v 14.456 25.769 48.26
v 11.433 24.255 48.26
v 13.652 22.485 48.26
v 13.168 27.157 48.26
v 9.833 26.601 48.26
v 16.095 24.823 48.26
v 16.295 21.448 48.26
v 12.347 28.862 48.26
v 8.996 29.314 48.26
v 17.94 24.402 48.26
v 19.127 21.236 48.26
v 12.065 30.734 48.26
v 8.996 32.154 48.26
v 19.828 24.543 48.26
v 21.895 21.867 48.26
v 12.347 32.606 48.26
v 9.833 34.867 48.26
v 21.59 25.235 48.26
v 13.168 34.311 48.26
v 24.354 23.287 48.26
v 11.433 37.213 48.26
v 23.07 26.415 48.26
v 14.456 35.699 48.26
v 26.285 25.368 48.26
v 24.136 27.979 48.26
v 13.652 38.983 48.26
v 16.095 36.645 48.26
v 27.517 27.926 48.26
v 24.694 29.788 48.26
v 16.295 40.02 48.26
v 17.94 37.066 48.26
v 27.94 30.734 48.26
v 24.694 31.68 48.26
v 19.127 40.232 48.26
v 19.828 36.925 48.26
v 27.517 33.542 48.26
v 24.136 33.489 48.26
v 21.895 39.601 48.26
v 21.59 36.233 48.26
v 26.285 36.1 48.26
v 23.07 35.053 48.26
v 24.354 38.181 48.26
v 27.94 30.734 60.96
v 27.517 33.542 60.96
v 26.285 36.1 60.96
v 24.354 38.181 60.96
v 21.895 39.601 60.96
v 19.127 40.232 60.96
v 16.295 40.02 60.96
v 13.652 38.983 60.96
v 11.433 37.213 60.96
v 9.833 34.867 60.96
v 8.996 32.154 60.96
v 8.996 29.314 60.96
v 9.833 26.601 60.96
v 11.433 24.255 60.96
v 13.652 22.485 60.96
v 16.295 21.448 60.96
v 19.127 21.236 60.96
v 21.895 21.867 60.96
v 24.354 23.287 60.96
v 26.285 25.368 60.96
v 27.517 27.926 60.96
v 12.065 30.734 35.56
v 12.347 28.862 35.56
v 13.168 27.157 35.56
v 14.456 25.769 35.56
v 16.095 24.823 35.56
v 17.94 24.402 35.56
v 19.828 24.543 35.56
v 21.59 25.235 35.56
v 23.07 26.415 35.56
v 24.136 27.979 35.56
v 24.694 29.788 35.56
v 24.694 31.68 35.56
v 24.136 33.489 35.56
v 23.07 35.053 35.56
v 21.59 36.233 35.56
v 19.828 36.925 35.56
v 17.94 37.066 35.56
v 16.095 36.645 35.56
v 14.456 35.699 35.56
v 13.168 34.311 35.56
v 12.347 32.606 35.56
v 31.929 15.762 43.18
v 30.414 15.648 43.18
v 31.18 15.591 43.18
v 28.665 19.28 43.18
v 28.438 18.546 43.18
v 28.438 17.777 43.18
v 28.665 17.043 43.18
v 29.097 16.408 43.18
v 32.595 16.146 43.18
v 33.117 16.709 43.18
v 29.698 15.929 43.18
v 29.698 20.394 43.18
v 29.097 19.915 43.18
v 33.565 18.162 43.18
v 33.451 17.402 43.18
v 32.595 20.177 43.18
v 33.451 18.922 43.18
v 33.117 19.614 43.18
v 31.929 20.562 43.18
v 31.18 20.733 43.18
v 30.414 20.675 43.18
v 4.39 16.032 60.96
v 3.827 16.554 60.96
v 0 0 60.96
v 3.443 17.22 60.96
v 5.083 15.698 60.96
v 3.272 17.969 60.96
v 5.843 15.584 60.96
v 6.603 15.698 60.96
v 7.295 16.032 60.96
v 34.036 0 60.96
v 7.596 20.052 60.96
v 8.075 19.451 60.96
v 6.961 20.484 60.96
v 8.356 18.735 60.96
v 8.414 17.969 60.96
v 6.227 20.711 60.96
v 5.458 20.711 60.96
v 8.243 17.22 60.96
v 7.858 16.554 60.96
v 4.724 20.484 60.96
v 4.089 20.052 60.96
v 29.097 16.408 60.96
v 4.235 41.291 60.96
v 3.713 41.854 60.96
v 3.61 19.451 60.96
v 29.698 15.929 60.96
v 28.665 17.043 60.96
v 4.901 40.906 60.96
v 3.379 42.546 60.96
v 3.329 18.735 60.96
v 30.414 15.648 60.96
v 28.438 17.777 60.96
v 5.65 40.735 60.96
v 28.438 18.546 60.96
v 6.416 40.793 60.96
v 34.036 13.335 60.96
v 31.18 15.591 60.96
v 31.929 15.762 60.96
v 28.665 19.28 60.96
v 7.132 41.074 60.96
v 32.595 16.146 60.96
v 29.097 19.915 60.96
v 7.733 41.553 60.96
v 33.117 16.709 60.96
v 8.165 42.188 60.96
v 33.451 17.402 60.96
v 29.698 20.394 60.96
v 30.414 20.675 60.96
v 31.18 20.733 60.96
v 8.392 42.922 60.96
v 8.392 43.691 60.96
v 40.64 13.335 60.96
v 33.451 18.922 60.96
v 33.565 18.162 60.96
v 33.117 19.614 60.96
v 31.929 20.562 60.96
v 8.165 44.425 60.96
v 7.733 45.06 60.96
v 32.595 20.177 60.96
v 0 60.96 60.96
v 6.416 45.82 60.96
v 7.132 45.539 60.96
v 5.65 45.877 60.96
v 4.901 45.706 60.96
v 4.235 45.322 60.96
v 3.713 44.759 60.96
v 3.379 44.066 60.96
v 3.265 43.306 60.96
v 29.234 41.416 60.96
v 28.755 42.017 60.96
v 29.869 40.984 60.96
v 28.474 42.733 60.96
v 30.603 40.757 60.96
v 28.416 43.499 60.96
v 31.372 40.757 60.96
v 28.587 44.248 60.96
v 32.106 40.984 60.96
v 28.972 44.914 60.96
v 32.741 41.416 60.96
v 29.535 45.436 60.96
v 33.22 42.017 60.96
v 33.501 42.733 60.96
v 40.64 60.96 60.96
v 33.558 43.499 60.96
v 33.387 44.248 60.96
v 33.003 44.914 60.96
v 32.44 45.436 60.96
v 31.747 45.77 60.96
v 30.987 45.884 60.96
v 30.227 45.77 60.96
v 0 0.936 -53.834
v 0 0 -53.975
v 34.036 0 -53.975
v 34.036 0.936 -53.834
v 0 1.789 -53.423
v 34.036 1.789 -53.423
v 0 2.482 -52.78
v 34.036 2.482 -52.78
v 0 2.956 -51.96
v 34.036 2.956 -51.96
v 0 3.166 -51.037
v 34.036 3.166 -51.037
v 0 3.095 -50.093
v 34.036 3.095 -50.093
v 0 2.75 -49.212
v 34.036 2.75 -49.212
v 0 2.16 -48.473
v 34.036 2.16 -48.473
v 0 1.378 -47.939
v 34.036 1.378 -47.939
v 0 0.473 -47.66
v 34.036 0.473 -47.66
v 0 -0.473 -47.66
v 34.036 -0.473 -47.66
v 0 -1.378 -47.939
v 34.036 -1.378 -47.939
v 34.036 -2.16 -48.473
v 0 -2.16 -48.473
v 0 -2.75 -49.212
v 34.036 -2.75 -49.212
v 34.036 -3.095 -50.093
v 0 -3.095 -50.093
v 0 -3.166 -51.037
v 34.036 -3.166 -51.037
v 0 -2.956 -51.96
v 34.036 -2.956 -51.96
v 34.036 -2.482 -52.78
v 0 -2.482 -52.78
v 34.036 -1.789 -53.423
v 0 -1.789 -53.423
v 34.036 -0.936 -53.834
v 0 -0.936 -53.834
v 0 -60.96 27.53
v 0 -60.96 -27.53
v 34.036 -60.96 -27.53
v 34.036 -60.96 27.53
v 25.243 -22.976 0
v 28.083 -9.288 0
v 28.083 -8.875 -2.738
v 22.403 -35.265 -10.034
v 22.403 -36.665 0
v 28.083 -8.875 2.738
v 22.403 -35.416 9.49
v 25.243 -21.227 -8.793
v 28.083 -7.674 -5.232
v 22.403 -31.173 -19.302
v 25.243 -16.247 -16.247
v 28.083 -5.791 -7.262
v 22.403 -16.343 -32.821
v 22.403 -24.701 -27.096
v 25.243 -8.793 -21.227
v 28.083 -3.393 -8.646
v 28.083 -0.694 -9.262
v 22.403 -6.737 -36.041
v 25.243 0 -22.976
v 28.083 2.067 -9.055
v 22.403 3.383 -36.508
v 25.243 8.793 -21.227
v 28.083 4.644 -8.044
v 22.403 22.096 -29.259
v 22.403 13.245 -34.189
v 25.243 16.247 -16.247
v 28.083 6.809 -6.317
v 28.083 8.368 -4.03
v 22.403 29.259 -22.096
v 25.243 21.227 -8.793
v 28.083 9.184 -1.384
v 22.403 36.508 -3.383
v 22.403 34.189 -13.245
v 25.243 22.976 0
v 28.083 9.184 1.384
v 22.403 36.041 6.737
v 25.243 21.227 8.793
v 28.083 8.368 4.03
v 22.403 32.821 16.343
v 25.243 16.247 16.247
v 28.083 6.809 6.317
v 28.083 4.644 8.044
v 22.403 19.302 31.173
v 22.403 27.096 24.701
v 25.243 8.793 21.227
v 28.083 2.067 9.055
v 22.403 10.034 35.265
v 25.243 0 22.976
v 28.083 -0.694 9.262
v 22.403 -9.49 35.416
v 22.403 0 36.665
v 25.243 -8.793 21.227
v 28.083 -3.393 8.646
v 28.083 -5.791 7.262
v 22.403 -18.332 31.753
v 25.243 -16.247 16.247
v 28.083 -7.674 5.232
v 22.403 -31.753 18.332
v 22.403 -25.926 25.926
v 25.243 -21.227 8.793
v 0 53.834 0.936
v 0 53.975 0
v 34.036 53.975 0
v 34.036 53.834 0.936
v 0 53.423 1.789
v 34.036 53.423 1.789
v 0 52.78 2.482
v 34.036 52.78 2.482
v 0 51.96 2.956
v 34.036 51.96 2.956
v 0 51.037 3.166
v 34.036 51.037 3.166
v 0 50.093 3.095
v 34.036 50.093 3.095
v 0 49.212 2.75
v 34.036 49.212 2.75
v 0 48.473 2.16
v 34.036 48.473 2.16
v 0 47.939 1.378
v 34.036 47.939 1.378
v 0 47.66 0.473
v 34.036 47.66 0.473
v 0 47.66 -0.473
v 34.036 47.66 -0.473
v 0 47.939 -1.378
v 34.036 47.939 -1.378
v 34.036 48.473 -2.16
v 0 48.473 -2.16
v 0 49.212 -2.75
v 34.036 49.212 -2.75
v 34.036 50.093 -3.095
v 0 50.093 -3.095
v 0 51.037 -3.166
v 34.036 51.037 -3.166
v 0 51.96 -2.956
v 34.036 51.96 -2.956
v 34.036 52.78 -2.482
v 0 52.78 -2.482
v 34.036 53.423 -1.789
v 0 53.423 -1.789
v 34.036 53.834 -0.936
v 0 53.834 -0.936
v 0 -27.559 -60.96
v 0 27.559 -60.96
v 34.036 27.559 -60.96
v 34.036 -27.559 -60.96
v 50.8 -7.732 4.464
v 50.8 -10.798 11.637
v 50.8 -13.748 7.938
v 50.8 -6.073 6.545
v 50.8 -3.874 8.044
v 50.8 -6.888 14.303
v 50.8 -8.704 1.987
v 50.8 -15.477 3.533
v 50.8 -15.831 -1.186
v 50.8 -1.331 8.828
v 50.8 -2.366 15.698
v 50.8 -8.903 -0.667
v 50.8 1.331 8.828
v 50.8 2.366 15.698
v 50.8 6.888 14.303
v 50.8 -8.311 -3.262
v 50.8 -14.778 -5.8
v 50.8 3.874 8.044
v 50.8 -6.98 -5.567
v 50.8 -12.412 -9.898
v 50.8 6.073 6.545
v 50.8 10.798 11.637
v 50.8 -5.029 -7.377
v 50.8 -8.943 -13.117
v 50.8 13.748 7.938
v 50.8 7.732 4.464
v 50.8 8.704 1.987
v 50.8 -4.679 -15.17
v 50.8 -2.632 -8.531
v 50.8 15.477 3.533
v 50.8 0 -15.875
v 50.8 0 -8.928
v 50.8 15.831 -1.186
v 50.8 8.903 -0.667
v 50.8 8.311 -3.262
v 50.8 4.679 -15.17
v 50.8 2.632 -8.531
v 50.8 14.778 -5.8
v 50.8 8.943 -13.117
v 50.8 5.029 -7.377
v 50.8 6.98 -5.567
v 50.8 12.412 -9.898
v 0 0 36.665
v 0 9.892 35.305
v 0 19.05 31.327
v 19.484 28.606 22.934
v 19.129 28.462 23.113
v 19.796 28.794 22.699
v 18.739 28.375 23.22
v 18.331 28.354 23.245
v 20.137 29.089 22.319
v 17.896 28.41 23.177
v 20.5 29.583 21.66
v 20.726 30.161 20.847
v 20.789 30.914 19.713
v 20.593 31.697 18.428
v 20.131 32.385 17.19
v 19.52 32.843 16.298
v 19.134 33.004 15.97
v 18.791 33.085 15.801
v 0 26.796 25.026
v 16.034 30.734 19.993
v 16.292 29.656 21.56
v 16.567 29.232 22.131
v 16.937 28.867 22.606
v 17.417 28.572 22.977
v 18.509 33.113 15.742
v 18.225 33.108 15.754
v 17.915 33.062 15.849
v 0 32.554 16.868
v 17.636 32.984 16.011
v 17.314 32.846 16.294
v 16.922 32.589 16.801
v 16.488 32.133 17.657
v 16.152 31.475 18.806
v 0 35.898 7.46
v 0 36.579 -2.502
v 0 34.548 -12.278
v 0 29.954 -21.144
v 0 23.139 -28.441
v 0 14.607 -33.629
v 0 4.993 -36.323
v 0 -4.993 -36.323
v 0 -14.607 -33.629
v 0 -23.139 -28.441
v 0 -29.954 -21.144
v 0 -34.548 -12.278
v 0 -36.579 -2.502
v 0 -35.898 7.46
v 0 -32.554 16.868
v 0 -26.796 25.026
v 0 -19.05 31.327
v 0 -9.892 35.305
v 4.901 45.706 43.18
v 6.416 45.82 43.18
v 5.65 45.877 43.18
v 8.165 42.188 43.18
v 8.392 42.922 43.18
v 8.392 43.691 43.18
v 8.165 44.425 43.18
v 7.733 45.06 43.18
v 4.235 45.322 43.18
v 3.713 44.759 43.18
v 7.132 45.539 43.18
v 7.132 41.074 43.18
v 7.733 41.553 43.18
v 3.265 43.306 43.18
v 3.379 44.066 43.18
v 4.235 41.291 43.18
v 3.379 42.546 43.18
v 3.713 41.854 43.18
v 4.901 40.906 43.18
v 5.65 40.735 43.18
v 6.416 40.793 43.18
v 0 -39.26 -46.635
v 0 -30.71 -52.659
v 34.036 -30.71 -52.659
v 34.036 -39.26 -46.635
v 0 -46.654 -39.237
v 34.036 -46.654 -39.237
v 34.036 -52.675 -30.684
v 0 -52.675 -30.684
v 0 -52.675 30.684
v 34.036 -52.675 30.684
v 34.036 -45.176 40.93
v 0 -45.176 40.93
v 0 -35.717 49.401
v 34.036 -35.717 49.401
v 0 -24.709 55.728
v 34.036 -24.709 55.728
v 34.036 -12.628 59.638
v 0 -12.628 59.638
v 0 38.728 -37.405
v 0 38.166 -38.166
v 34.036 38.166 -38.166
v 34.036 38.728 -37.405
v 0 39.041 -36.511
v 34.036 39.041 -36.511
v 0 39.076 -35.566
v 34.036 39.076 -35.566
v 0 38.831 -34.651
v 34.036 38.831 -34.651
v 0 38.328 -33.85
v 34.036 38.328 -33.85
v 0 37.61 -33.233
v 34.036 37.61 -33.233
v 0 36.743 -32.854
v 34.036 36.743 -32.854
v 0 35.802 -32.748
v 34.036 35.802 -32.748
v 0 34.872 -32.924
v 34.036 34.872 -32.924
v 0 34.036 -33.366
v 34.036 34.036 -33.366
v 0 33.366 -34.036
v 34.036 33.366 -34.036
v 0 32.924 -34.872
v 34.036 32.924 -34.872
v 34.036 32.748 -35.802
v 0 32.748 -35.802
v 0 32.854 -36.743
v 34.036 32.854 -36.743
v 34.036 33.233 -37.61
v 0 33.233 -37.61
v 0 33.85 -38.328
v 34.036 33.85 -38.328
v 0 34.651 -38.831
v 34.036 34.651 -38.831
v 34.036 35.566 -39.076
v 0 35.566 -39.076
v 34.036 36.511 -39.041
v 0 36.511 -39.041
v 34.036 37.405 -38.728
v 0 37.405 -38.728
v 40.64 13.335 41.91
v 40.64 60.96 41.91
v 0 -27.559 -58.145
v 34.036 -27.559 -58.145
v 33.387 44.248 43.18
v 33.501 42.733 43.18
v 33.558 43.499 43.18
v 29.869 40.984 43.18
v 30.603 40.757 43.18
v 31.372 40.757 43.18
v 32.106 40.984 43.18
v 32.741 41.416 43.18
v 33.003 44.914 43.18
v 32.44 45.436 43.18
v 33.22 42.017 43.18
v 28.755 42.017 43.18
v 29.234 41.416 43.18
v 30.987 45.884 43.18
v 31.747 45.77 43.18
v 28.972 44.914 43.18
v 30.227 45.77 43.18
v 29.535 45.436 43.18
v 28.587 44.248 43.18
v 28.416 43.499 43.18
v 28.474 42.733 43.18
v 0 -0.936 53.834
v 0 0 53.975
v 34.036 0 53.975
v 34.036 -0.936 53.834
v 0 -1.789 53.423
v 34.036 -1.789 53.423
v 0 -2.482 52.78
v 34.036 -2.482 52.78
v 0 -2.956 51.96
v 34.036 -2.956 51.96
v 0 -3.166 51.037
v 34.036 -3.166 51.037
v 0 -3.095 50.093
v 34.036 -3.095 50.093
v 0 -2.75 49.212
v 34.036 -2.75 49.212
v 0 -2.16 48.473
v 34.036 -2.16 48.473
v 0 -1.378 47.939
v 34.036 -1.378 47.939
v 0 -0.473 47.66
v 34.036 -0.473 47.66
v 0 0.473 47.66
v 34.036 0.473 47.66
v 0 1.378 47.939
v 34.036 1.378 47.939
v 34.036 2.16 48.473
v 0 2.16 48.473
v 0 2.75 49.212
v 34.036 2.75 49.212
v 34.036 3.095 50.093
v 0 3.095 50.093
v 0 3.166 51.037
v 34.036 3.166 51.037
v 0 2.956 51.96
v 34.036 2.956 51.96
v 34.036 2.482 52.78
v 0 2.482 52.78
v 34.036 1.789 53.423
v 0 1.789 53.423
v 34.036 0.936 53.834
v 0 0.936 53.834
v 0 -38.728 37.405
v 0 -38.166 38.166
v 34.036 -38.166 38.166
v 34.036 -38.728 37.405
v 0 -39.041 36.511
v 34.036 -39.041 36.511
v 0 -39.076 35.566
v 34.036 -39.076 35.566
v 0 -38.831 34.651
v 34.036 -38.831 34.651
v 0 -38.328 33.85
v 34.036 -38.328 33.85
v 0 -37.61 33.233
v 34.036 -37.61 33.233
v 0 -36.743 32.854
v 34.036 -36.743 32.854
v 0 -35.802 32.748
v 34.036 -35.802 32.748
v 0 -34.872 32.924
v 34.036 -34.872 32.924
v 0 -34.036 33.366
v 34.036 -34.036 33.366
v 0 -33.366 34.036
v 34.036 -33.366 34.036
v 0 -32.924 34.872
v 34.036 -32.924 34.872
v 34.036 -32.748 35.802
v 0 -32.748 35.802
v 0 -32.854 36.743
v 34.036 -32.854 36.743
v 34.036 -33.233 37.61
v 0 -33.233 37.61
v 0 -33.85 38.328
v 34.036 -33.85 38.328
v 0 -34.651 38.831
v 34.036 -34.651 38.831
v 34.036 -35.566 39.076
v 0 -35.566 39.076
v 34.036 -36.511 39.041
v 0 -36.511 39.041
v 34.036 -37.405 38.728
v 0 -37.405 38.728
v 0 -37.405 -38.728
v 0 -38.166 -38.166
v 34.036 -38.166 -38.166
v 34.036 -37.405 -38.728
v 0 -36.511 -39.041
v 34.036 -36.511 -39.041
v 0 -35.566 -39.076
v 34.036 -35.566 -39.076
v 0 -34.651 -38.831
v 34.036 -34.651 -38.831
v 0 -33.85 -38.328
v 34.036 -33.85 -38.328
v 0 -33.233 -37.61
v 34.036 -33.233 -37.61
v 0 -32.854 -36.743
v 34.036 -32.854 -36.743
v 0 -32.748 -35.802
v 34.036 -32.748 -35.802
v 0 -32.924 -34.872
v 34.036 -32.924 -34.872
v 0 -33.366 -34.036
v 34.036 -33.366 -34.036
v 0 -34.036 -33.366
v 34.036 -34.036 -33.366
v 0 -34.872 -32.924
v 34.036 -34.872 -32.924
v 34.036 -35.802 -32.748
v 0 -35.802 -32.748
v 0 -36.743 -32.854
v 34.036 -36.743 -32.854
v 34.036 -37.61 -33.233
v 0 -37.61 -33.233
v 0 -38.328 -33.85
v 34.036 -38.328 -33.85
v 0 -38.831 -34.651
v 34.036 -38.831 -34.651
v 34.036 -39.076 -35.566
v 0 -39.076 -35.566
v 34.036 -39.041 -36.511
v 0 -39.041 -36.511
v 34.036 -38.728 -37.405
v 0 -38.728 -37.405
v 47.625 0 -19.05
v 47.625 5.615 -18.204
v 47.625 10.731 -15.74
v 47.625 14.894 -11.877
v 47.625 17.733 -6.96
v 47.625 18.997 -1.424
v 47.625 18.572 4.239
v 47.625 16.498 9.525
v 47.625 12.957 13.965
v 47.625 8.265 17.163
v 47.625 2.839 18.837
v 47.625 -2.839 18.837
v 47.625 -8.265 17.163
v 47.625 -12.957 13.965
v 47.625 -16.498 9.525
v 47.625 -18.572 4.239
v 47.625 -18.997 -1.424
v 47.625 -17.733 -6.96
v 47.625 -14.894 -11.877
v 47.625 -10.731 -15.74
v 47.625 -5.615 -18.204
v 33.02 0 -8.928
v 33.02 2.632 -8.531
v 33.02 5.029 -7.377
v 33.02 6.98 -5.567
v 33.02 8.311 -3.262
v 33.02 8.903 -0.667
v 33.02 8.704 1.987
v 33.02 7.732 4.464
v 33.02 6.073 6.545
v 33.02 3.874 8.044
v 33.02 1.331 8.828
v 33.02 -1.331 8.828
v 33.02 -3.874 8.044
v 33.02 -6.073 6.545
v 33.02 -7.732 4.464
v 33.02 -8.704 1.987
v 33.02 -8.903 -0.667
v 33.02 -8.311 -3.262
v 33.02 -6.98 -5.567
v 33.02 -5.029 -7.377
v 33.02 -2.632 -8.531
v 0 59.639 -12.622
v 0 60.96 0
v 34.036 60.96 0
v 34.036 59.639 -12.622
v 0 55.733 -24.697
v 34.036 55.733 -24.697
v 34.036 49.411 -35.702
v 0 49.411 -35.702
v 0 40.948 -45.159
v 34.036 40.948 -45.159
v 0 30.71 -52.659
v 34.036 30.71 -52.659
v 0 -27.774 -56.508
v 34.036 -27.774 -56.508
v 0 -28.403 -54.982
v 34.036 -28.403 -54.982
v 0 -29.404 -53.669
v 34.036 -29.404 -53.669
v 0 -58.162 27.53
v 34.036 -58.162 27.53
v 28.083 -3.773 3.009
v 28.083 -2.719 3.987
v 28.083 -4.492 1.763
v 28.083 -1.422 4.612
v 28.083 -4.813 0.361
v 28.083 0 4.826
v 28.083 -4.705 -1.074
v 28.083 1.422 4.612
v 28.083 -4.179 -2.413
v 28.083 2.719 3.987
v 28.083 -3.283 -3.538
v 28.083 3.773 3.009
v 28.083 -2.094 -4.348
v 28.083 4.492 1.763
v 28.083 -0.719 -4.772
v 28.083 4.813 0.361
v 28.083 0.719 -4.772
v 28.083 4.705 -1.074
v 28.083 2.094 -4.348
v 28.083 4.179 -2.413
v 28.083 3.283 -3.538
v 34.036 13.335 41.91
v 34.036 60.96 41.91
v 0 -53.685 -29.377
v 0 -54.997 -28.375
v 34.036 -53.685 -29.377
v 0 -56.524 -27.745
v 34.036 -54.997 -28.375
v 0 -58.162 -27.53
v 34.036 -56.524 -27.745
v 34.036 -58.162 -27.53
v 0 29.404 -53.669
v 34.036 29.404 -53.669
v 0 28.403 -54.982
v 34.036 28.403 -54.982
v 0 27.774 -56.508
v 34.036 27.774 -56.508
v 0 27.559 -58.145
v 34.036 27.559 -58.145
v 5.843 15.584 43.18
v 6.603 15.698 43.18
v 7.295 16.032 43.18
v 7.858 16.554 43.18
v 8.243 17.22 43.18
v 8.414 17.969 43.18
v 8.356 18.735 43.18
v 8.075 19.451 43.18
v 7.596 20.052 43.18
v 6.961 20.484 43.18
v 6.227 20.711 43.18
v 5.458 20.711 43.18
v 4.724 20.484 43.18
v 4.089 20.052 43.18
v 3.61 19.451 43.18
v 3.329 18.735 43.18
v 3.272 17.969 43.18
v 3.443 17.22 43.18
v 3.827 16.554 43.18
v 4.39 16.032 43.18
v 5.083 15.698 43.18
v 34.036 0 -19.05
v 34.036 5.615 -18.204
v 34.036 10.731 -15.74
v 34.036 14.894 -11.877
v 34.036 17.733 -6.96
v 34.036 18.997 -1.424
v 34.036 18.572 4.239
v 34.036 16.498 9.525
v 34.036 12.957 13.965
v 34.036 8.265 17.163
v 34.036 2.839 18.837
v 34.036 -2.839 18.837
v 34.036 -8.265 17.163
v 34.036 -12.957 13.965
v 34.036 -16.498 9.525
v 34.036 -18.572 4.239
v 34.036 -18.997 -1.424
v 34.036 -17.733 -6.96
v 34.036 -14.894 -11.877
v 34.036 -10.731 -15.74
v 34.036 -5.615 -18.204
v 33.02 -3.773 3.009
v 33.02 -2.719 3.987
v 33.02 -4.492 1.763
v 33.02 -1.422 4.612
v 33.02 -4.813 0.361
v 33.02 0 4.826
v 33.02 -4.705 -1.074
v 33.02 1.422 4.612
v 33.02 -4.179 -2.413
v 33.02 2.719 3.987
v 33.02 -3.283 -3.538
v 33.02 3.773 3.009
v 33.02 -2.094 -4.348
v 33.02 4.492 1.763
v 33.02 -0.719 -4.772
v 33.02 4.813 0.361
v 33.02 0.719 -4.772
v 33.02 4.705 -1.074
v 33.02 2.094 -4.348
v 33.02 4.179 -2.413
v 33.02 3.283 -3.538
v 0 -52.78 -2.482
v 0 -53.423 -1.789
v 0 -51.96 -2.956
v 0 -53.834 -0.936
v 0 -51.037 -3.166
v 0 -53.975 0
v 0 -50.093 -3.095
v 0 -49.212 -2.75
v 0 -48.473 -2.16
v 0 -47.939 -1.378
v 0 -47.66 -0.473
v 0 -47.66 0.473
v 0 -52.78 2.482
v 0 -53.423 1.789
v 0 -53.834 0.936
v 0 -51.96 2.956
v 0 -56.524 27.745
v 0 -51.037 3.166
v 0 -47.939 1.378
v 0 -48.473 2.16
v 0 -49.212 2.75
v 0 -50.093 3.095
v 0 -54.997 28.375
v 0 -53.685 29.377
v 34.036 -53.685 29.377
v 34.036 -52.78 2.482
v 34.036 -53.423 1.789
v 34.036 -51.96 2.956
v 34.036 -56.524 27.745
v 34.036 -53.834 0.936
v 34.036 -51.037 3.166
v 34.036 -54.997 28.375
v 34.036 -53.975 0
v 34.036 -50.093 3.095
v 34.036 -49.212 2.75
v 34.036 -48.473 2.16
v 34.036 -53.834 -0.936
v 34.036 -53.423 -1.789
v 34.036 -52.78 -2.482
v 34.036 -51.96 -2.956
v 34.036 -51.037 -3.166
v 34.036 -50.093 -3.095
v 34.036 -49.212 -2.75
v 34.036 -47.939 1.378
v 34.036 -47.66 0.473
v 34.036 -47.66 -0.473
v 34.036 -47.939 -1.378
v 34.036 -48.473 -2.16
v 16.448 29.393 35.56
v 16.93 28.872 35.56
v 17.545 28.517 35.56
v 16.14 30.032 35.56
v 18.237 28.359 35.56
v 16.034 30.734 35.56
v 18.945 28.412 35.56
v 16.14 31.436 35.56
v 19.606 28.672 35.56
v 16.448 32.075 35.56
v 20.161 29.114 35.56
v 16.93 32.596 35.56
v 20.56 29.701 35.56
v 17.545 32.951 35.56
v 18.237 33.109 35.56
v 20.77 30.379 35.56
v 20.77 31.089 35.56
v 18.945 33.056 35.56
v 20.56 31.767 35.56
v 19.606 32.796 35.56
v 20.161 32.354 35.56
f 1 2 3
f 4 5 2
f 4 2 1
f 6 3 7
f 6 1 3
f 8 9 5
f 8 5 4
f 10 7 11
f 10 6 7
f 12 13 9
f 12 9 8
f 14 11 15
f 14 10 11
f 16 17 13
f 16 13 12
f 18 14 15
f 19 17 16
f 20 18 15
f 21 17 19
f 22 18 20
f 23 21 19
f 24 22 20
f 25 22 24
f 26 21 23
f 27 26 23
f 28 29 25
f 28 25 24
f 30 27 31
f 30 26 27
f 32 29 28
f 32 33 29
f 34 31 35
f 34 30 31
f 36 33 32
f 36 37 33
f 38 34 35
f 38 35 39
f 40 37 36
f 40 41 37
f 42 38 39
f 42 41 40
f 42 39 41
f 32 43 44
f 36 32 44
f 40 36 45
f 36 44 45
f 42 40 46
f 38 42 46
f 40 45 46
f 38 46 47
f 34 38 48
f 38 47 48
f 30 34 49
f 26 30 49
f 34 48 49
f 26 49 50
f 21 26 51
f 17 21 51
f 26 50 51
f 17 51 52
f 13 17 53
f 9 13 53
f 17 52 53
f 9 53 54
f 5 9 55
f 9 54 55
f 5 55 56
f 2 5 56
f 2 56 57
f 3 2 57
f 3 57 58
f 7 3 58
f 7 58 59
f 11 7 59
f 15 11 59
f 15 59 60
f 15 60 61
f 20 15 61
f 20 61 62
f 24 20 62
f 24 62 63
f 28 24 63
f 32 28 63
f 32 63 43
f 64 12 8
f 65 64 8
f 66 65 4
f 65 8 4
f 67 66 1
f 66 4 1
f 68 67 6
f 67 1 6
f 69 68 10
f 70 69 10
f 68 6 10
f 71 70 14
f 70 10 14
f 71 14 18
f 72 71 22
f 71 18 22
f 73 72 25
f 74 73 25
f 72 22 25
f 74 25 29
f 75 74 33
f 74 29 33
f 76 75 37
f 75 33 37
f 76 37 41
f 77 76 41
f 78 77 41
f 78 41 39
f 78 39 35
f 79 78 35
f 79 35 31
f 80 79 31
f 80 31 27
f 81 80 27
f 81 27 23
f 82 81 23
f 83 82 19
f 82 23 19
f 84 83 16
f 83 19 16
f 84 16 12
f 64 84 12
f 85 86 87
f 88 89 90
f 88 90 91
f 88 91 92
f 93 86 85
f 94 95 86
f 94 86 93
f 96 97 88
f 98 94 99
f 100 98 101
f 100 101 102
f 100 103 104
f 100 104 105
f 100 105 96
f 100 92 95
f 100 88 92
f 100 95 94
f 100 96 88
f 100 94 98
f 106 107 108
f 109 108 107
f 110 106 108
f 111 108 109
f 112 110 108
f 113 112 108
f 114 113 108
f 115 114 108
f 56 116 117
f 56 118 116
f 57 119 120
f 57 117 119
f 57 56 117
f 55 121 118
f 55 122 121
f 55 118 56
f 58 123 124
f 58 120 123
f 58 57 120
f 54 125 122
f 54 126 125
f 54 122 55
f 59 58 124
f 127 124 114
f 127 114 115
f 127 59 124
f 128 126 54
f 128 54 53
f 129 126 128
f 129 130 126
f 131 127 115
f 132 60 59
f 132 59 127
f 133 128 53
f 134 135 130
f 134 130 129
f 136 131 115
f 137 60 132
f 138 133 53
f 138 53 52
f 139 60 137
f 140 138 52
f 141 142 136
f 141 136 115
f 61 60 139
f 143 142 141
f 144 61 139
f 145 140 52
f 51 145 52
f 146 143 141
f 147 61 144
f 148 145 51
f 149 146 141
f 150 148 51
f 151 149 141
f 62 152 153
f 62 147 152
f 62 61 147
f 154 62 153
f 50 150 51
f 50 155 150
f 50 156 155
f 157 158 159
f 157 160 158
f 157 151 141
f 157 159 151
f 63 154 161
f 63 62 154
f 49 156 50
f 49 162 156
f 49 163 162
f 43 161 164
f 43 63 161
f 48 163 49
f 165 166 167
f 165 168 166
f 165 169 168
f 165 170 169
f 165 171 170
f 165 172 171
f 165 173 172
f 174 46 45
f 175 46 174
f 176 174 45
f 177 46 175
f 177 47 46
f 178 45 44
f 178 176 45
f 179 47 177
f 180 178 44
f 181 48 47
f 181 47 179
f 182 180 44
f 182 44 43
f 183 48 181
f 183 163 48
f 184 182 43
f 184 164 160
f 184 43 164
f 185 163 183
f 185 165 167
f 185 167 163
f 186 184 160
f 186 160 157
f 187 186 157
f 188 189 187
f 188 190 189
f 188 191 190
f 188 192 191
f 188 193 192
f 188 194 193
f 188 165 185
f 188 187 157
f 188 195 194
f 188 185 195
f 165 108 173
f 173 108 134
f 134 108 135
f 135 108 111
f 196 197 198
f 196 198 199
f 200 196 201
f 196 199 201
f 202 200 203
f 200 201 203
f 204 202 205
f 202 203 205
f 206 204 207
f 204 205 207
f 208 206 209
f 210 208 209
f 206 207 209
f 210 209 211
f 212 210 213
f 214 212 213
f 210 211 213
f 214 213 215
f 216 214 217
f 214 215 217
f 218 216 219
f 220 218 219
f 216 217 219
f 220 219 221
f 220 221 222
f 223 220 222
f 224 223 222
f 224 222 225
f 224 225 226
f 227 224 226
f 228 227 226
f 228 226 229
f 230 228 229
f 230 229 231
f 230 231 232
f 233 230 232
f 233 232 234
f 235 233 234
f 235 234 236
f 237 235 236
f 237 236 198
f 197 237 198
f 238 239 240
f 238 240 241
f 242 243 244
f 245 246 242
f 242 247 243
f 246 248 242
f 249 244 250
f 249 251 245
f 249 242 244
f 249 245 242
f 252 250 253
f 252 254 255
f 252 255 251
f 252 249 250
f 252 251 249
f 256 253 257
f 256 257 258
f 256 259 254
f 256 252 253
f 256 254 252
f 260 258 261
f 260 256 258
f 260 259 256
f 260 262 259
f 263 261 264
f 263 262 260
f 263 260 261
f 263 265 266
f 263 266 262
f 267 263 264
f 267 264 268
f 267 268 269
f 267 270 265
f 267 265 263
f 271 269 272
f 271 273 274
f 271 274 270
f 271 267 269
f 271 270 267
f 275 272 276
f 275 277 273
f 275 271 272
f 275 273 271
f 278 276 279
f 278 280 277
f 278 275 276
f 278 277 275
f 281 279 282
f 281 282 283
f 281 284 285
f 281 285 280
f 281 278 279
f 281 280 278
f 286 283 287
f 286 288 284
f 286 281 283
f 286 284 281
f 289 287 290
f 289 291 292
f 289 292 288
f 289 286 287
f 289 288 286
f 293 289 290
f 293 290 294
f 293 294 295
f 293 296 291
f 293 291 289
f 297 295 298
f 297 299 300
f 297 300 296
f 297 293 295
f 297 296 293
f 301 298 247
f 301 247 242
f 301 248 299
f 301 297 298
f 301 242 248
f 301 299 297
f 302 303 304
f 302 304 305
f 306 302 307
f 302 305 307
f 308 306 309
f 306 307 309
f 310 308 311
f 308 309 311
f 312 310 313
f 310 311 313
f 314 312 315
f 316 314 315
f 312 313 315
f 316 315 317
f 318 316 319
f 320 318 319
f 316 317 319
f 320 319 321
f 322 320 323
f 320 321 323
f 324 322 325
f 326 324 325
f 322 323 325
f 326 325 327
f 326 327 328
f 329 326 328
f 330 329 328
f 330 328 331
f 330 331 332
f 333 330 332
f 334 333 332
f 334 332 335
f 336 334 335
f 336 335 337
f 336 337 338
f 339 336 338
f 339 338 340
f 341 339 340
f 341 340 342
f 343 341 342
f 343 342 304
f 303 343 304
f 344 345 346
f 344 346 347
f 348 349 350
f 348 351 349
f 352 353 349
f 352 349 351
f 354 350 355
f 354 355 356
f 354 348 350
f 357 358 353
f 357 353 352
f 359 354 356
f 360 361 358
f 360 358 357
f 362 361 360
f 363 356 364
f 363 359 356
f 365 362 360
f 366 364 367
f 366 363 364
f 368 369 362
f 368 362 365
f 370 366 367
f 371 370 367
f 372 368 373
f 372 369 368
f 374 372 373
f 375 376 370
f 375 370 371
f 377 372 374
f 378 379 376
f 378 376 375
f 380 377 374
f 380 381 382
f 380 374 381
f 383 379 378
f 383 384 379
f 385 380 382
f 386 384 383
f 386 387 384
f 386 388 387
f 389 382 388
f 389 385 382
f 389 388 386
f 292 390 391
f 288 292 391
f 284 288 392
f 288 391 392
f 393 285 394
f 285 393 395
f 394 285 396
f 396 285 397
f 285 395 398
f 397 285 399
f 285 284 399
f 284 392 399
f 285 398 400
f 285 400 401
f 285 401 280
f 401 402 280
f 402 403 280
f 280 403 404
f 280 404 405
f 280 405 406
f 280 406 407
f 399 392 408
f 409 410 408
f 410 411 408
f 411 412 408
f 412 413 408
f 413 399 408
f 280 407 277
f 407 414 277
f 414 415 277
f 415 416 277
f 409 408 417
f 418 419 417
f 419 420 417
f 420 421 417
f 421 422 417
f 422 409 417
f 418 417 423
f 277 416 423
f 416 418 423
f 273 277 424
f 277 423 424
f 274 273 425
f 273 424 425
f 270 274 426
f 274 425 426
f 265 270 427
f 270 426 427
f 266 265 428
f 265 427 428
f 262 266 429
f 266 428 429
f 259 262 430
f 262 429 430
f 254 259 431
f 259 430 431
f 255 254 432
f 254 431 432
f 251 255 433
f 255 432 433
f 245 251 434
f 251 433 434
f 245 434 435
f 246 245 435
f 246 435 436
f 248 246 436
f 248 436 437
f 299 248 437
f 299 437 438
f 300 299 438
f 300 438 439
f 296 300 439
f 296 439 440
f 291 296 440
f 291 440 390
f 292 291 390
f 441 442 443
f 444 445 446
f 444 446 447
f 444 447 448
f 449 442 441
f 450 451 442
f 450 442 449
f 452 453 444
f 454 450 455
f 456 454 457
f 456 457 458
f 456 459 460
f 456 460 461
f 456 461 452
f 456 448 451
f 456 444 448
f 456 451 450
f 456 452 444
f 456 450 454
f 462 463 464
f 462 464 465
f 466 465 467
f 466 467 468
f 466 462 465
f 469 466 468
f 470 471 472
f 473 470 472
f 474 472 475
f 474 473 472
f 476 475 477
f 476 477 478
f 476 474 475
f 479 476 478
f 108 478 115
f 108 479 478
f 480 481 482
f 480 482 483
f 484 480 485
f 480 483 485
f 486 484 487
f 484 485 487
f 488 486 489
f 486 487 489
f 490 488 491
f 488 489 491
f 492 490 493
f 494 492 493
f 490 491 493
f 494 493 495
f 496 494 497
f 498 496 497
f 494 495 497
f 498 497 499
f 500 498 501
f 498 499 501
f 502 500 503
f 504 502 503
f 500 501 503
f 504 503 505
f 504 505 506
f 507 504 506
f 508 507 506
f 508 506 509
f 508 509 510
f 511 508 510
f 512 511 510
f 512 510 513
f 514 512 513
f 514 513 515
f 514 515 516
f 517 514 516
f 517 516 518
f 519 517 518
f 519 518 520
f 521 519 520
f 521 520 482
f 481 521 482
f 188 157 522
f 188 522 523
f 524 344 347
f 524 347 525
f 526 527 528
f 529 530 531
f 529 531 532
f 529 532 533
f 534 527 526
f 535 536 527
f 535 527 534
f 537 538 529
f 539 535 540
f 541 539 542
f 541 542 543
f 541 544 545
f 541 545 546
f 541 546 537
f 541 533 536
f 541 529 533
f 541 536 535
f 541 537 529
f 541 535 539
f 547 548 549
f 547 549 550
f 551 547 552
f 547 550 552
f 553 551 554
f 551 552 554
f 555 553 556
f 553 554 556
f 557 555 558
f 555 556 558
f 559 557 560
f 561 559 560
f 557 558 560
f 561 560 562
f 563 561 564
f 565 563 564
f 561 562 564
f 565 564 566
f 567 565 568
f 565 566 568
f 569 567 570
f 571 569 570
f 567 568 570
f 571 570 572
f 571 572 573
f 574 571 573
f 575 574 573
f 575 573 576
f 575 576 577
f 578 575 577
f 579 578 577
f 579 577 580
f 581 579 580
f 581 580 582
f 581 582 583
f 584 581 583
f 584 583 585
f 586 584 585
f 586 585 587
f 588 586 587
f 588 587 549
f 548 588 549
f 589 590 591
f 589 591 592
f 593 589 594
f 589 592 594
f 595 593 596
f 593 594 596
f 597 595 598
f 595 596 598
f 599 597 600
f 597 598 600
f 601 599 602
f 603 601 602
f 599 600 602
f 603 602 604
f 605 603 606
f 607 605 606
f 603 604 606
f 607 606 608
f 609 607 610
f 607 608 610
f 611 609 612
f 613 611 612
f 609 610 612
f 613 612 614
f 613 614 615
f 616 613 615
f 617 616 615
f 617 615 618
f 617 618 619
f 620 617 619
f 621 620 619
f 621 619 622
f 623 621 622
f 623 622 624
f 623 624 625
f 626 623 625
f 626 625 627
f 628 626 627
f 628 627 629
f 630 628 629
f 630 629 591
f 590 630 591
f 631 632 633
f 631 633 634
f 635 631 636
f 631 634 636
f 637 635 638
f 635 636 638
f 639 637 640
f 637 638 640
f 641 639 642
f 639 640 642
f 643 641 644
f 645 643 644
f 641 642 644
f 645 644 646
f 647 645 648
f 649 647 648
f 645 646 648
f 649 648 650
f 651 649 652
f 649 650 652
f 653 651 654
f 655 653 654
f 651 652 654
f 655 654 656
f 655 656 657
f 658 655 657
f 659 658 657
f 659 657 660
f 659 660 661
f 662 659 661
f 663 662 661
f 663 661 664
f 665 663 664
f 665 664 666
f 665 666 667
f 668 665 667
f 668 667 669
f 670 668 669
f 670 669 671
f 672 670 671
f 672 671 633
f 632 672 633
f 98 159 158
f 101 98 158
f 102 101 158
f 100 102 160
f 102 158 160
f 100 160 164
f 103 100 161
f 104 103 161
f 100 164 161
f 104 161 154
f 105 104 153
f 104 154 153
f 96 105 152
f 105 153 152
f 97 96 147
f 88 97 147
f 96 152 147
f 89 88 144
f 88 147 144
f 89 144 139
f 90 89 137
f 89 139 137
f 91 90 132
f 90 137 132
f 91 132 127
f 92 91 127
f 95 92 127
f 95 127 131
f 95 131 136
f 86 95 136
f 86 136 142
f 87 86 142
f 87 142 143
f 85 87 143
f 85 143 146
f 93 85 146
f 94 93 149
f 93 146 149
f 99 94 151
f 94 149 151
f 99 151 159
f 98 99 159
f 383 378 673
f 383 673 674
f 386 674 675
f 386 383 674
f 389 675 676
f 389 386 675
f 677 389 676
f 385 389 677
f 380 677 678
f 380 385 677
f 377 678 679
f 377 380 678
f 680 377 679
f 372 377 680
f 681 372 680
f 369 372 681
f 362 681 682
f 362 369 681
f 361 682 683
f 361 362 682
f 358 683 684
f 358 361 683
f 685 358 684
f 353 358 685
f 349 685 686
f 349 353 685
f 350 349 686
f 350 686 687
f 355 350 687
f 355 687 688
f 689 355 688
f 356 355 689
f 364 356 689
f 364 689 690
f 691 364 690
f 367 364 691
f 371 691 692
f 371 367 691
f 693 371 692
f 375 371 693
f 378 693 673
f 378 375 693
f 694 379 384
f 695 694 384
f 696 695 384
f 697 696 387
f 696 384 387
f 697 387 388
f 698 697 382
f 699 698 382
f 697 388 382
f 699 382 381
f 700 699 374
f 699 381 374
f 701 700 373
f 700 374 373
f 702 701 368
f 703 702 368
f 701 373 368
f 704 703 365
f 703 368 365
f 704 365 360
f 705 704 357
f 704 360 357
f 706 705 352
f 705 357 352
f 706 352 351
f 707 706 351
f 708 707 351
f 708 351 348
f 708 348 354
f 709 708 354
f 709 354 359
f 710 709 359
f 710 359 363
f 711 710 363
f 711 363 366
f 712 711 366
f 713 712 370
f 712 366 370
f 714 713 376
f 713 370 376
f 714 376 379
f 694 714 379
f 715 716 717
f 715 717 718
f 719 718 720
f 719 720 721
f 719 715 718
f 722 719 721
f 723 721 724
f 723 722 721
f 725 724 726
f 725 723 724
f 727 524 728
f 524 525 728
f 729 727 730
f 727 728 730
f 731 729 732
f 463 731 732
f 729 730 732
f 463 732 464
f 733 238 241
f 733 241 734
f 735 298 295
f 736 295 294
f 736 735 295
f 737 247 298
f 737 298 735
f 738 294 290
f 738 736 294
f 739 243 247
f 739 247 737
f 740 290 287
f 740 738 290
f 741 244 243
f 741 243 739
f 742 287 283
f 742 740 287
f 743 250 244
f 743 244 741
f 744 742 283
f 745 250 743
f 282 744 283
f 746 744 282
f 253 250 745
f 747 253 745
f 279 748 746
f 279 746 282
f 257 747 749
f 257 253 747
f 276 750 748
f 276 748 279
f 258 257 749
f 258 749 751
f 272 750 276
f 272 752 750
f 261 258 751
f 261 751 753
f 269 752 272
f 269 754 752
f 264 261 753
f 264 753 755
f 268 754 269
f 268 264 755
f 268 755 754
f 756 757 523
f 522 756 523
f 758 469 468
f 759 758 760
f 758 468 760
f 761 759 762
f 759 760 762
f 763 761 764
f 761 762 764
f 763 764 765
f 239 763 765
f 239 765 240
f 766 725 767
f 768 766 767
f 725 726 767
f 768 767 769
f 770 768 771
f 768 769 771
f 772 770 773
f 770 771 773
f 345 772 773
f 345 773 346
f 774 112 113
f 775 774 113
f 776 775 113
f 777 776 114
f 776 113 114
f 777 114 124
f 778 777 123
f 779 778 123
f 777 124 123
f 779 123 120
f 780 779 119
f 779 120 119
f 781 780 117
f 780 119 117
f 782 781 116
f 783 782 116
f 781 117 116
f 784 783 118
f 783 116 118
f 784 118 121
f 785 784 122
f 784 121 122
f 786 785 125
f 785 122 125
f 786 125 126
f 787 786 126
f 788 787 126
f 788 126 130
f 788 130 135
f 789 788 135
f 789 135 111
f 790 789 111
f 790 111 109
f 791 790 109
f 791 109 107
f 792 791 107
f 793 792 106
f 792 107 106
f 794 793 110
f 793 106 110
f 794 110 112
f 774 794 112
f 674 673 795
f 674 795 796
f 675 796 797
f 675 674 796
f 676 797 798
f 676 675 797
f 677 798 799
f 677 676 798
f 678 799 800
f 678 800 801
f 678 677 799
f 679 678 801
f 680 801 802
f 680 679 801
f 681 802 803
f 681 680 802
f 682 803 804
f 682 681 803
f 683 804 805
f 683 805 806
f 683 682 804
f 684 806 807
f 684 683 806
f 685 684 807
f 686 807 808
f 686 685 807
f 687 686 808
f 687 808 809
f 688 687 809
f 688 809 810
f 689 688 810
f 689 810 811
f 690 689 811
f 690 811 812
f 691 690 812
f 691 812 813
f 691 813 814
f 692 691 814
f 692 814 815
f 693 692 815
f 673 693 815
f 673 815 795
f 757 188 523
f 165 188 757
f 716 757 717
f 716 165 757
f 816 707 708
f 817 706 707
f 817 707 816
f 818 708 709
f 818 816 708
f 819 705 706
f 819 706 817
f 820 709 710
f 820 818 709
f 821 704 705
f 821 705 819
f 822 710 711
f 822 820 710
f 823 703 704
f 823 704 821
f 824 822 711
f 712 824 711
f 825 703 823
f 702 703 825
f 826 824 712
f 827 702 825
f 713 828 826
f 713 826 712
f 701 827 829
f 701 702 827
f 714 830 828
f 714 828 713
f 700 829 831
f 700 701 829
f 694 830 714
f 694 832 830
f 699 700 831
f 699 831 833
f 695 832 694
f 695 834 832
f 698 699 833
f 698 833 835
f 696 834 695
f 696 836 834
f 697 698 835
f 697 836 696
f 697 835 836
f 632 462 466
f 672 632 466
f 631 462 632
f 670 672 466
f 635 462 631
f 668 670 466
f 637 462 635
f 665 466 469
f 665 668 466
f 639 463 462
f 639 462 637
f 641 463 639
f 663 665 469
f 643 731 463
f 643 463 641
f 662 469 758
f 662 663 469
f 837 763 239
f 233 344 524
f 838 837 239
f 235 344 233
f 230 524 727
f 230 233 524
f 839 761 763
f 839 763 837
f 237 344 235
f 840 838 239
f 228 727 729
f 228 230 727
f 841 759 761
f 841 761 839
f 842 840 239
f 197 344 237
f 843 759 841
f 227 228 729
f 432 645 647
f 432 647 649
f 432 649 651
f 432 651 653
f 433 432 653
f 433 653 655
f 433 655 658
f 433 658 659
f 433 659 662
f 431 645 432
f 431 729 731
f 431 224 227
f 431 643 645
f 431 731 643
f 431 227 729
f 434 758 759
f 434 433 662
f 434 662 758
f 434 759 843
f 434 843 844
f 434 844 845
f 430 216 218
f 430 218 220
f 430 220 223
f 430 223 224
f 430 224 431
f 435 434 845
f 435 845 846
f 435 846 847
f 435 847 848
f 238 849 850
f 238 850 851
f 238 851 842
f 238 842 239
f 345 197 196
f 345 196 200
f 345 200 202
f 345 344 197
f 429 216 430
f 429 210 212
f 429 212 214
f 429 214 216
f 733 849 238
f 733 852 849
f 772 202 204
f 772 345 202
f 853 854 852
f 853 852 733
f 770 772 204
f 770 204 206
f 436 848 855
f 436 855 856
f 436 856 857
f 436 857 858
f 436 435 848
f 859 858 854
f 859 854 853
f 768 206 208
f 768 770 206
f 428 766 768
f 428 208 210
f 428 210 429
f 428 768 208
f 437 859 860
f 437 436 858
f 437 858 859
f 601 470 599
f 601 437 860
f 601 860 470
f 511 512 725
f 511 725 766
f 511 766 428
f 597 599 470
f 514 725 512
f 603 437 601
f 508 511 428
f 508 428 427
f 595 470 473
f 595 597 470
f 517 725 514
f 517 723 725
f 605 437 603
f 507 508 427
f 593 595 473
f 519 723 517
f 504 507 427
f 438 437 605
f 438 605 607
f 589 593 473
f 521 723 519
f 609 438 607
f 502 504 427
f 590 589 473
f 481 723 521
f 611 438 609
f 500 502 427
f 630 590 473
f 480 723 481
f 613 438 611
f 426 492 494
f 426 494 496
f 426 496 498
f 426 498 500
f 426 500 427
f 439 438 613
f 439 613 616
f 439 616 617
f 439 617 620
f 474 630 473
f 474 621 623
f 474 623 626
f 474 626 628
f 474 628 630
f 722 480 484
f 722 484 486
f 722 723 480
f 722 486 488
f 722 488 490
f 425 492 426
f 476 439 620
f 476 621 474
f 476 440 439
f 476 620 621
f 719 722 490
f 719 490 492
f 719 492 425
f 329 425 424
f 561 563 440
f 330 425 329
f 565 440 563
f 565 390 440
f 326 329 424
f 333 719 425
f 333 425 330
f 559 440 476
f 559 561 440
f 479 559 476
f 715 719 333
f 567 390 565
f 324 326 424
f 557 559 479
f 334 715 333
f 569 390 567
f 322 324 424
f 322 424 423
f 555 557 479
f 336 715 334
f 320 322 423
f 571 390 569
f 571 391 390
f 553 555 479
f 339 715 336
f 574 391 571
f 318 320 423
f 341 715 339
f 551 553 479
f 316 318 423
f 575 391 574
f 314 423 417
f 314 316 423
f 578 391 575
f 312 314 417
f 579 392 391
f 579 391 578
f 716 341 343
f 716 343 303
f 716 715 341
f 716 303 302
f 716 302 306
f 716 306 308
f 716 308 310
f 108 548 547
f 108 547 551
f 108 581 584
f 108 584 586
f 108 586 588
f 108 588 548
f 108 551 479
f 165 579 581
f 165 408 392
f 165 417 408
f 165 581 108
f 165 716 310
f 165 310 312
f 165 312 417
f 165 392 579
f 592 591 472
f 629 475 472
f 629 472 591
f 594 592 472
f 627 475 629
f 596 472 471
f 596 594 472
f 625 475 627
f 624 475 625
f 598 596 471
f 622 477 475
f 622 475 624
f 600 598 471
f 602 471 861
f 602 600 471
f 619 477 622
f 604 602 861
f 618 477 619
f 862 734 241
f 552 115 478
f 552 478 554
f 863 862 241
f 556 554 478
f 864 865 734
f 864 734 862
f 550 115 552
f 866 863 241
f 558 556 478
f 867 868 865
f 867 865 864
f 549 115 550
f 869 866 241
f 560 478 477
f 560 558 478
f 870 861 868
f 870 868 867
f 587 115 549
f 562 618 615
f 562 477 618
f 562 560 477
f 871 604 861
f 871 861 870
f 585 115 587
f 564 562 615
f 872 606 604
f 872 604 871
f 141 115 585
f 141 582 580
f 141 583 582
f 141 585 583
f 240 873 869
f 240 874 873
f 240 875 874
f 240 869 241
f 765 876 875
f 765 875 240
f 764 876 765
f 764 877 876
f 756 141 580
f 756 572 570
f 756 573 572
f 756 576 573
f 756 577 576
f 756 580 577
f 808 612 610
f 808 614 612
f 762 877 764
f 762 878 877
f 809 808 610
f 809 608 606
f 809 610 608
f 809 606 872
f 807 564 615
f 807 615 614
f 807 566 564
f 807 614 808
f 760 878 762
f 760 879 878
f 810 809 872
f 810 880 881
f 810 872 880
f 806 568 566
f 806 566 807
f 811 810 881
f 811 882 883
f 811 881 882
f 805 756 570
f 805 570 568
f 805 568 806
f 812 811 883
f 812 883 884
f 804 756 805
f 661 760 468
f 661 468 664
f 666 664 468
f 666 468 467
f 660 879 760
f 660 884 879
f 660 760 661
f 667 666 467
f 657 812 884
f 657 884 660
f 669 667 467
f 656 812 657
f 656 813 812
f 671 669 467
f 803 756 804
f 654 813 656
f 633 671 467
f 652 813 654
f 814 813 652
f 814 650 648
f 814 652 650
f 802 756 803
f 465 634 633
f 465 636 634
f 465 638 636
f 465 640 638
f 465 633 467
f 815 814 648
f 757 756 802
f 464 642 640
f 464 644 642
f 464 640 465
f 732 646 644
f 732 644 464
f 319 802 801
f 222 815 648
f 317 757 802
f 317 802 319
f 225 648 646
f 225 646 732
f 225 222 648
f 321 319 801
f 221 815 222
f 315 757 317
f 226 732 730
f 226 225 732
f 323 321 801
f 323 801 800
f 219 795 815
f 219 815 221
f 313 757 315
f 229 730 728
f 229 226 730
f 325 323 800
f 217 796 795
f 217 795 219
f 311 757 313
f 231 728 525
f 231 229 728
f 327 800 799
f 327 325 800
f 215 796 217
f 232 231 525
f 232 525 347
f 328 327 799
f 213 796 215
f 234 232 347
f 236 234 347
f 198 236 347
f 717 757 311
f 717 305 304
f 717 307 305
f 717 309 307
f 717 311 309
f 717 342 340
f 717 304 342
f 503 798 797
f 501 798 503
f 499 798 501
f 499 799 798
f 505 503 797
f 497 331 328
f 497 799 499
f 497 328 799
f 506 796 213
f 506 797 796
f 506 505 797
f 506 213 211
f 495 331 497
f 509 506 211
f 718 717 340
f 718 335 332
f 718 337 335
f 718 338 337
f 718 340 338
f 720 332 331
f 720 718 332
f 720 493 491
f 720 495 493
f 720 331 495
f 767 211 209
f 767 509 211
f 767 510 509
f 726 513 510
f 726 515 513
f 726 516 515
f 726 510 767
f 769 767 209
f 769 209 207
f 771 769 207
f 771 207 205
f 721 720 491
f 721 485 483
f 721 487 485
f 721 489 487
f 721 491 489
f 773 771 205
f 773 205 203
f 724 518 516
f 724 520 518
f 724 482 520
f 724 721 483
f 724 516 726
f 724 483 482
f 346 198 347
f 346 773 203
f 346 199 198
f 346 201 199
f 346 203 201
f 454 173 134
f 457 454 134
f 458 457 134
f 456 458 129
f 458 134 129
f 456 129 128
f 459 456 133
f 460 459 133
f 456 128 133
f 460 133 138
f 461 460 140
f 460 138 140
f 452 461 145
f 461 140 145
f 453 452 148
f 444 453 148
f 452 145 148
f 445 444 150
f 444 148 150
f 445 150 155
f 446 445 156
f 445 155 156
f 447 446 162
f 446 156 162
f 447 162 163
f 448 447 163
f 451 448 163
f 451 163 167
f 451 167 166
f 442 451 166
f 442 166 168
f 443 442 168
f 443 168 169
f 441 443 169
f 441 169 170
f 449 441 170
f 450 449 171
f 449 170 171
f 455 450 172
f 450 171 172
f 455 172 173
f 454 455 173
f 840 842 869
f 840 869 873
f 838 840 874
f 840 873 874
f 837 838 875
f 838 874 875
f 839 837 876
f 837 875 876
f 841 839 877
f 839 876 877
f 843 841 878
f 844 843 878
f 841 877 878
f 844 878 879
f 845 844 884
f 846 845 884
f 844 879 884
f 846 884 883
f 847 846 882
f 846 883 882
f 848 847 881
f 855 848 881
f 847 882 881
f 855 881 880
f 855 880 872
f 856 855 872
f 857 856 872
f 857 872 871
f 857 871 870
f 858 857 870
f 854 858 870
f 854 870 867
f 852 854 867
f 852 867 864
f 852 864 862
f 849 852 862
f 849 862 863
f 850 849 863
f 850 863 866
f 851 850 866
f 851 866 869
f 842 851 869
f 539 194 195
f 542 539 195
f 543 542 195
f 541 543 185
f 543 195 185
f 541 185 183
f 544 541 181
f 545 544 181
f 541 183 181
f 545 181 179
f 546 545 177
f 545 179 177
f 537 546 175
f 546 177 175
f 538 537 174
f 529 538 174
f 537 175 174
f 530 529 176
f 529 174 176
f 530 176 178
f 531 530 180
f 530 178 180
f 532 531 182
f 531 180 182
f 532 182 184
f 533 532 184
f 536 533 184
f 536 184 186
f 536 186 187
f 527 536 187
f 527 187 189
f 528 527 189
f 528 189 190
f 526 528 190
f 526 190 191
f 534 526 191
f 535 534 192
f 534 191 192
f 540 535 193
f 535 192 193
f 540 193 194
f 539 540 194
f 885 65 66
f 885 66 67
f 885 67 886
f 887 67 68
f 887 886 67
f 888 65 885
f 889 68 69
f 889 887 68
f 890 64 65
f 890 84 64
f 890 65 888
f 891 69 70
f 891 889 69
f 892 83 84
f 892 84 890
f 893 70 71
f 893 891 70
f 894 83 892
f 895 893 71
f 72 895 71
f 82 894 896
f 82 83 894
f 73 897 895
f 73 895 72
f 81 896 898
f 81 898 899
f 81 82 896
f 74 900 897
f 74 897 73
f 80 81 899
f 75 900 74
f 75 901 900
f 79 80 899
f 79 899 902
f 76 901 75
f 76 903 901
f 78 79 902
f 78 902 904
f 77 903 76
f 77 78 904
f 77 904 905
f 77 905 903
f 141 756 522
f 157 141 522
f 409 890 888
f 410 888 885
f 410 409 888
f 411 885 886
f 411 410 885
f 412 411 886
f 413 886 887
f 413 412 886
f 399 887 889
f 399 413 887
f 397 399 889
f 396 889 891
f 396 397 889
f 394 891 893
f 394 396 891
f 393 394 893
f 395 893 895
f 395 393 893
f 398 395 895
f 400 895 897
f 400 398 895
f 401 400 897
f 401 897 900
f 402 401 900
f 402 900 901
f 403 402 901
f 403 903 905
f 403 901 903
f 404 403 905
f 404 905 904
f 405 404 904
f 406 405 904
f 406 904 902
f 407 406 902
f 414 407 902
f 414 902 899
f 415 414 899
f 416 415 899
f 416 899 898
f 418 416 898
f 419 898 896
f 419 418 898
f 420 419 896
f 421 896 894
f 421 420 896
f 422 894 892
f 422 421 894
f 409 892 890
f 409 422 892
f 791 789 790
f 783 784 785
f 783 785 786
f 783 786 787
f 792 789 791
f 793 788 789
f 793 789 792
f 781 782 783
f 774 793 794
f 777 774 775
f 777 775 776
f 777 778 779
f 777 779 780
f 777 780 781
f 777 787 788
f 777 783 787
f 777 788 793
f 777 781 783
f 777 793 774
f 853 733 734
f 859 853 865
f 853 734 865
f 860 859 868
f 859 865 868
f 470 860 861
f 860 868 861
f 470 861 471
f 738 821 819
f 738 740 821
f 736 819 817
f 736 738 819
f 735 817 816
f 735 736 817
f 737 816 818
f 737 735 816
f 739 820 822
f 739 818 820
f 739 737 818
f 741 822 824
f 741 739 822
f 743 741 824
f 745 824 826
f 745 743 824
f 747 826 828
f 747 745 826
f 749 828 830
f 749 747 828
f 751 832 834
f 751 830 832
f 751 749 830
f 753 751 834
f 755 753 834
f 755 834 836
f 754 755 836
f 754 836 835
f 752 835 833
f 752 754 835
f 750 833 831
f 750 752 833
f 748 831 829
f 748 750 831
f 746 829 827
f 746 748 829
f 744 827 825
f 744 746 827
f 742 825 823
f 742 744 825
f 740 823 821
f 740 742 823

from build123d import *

# Parameters (mm, degrees)
HOUSING_2_DEPTH          = 44.45
SKETCH2_R                = 36.6649
IMPELLER_CUT_DEPTH       = 22.4028
SKETCH4_R                = 4.826
INLET_CUT_DEPTH          = 19.8628
SKETCH6_R                = 3.175
FASTENER_BORE_DEPTH      = 116.84
FASTENER_PATTERN_COUNT   = 8
SKETCH7_R                = 100.114274451
SKETCH7_R_2              = 19.05
MASS_REDUCTION_CUT_DEPTH = 10.414
SKETCH11_R               = 19.05
SKETCH11_R_2             = 4.826
BOSS_EXTRUDE1_DEPTH      = 6.35
SKETCH14_R               = 2.38125
CUT_EXTRUDE3_DEPTH       = 99.06
SKETCH15_R               = 9.525
CUT_EXTRUDE4_DEPTH       = 25.4
BOSS_EXTRUDE2_START      = 12.7
SKETCH16_R               = 9.525
SKETCH16_R_2             = 6.35
BOSS_EXTRUDE2_DEPTH      = 12.7
SKETCH18_W               = 6.604
SKETCH18_H               = 47.625
BOSS_EXTRUDE3_DEPTH      = 19.05
SKETCH19_R               = 2.5781
CUT_EXTRUDE5_DEPTH       = 17.78
CIRPATTERN2_COUNT        = 4
FILLET9_R                = 6.35
SKETCH22_R               = 8.9281
CUT_EXTRUDE8_DEPTH       = 17.78
CHAMFER1_SIZE            = 3.175


with BuildPart() as part:
    # Sketch1 → Housing 2 (new body)
    with BuildSketch(Plane(origin=(0, 0, 0), x_dir=(0, 0, -1), z_dir=(1, 0, 0))):
        with BuildLine():
            Line((-60.96, 0), (-60.96, 60.96))
            Line((-60.96, 60.96), (0, 60.96))
            ThreePointArc((0, 60.96), (31.907091375, 51.942844743), (54.374839025, 27.559))
            Line((54.374839025, 27.559), (60.96, 27.559))
            Line((60.96, 27.559), (60.96, -27.559))
            Line((60.96, -27.559), (54.374839025, -27.559))
            ThreePointArc((54.374839025, -27.559), (43.093739421, -43.116716279), (27.530012063, -54.389521379))
            Line((27.530012063, -54.389521379), (27.530012063, -60.96))
            Line((27.530012063, -60.96), (-27.530012063, -60.96))
            Line((-27.530012063, -60.96), (-27.530012063, -54.389521379))
            ThreePointArc((-27.530012063, -54.389521379), (-51.934339003, -31.920934077), (-60.96, 0))
        make_face()
    extrude(amount=HOUSING_2_DEPTH)

    # Sketch2 → Impeller Cut (cut)
    with BuildSketch(Plane.ZY):
        Circle(SKETCH2_R)
    extrude(amount=-IMPELLER_CUT_DEPTH, mode=Mode.SUBTRACT)

    # Sketch3 → Impeller Angle Cut (revolve, cut)
    with BuildSketch(Plane.XY, mode=Mode.PRIVATE) as impeller_angle_cut_sk:
        Polygon((28.08333914, 9.28793198), (22.4028, 36.6649), (22.225, 0), (28.08333914, 0), align=None)
    revolve(impeller_angle_cut_sk.sketch.rotate(Axis((22.225, 0, 0), (1, 0, 0)), 180), axis=Axis((22.225, 0, 0), (1, 0, 0)), mode=Mode.SUBTRACT)

    # Sketch4 → Inlet Cut (cut)
    with BuildSketch(Plane.ZY.offset(-28.08333914)):
        Circle(SKETCH4_R)
    extrude(amount=-INLET_CUT_DEPTH, mode=Mode.SUBTRACT)

    # Sketch6 → Fastener Bore (cut)
    with BuildSketch(Plane(origin=(44.45, 0, 0), x_dir=(0, 0, -1), z_dir=(1, 0, 0))):
        with Locations((50.8, 0)):
            Circle(SKETCH6_R)
    fastener_bore = extrude(amount=-FASTENER_BORE_DEPTH, mode=Mode.SUBTRACT)

    # Fastener Pattern: Fastener Bore ×8 about axis, 1 skipped
    fastener_pattern_axis = Axis((0, 0, 0), (-1, 0, 0))
    add([fastener_bore.rotate(fastener_pattern_axis, i * 360 / FASTENER_PATTERN_COUNT) for i in range(1, FASTENER_PATTERN_COUNT) if i not in (5,)], mode=Mode.SUBTRACT)

    # Sketch7 → Mass Reduction Cut (cut)
    with BuildSketch(Plane(origin=(44.45, 0, 0), x_dir=(0, 0, -1), z_dir=(1, 0, 0))):
        Circle(SKETCH7_R)
        Circle(SKETCH7_R_2, mode=Mode.SUBTRACT)
    extrude(amount=-MASS_REDUCTION_CUT_DEPTH, mode=Mode.SUBTRACT)

    # Sketch11 → Boss-Extrude1 (add)
    with BuildSketch(Plane(origin=(44.45, 0, 0), x_dir=(0, 0, -1), z_dir=(1, 0, 0))):
        Circle(SKETCH11_R)
        with Locations(Location((0, 0, 0), (0, 0, 180))):
            Circle(SKETCH11_R_2, mode=Mode.SUBTRACT)
    extrude(amount=BOSS_EXTRUDE1_DEPTH)

    # Sketch14 → Cut-Extrude3 (cut)
    with BuildSketch(Plane.XY):
        with Locations(Location((18.415, 30.734, 0), (0, 0, 180))):
            Circle(SKETCH14_R)
    extrude(amount=CUT_EXTRUDE3_DEPTH, mode=Mode.SUBTRACT)

    # Sketch15 → Cut-Extrude4 (cut)
    with BuildSketch(Plane.XY.offset(60.96)):
        with Locations((18.415, 30.734)):
            Circle(SKETCH15_R)
    extrude(amount=-CUT_EXTRUDE4_DEPTH, mode=Mode.SUBTRACT)

    # Sketch16 → Boss-Extrude2 (add)
    with BuildSketch(Plane.XY.offset(35.56).offset(BOSS_EXTRUDE2_START)):
        with Locations((18.415, 30.734)):
            Circle(SKETCH16_R)
        with Locations(Location((18.415, 30.734, 0), (0, 0, 180))):
            Circle(SKETCH16_R_2, mode=Mode.SUBTRACT)
    extrude(amount=-BOSS_EXTRUDE2_DEPTH)

    # Sketch18 → Boss-Extrude3 (add)
    with BuildSketch(Plane.XY.offset(60.96)):
        with Locations((37.338, 37.1475)):
            Rectangle(SKETCH18_W, SKETCH18_H)
    extrude(amount=-BOSS_EXTRUDE3_DEPTH)

    # Sketch19 → Cut-Extrude5 (cut)
    with BuildSketch(Plane.XY.offset(60.96)):
        with Locations((30.987358569, 18.161641431)):
            Circle(SKETCH19_R)
    cut_extrude5 = extrude(amount=-CUT_EXTRUDE5_DEPTH, mode=Mode.SUBTRACT)

    # CirPattern2: Cut-Extrude5 ×4 about axis
    cirpattern2_axis = Axis((18.415, 30.734, 0), (0, 0, 1))
    for i in range(1, CIRPATTERN2_COUNT):
        add(cut_extrude5.rotate(cirpattern2_axis, i * 360 / CIRPATTERN2_COUNT), mode=Mode.SUBTRACT)

    # Fillet9
    fillet9_edges = [part.edges().sort_by_distance(p)[0] for p in [
        (17.018, 27.559, -54.374839025),
        (17.018, -27.559, -54.374839025),
        (17.018, -54.389521379, -27.530012063),
        (17.018, -54.389521379, 27.530012063),
    ]]
    fillet(fillet9_edges, radius=FILLET9_R)

    # Sketch22 → Cut-Extrude8 (cut)
    with BuildSketch(Plane(origin=(50.8, 0, 0), x_dir=(0, 0, -1), z_dir=(1, 0, 0))):
        Circle(SKETCH22_R)
    extrude(amount=-CUT_EXTRUDE8_DEPTH, mode=Mode.SUBTRACT)

    # Chamfer1
    chamfer1_edges = [part.edges().sort_by_distance(p)[0] for p in [
        (50.8, 0, 19.05),
    ]]
    chamfer(chamfer1_edges, length=CHAMFER1_SIZE)


solid = part.part
